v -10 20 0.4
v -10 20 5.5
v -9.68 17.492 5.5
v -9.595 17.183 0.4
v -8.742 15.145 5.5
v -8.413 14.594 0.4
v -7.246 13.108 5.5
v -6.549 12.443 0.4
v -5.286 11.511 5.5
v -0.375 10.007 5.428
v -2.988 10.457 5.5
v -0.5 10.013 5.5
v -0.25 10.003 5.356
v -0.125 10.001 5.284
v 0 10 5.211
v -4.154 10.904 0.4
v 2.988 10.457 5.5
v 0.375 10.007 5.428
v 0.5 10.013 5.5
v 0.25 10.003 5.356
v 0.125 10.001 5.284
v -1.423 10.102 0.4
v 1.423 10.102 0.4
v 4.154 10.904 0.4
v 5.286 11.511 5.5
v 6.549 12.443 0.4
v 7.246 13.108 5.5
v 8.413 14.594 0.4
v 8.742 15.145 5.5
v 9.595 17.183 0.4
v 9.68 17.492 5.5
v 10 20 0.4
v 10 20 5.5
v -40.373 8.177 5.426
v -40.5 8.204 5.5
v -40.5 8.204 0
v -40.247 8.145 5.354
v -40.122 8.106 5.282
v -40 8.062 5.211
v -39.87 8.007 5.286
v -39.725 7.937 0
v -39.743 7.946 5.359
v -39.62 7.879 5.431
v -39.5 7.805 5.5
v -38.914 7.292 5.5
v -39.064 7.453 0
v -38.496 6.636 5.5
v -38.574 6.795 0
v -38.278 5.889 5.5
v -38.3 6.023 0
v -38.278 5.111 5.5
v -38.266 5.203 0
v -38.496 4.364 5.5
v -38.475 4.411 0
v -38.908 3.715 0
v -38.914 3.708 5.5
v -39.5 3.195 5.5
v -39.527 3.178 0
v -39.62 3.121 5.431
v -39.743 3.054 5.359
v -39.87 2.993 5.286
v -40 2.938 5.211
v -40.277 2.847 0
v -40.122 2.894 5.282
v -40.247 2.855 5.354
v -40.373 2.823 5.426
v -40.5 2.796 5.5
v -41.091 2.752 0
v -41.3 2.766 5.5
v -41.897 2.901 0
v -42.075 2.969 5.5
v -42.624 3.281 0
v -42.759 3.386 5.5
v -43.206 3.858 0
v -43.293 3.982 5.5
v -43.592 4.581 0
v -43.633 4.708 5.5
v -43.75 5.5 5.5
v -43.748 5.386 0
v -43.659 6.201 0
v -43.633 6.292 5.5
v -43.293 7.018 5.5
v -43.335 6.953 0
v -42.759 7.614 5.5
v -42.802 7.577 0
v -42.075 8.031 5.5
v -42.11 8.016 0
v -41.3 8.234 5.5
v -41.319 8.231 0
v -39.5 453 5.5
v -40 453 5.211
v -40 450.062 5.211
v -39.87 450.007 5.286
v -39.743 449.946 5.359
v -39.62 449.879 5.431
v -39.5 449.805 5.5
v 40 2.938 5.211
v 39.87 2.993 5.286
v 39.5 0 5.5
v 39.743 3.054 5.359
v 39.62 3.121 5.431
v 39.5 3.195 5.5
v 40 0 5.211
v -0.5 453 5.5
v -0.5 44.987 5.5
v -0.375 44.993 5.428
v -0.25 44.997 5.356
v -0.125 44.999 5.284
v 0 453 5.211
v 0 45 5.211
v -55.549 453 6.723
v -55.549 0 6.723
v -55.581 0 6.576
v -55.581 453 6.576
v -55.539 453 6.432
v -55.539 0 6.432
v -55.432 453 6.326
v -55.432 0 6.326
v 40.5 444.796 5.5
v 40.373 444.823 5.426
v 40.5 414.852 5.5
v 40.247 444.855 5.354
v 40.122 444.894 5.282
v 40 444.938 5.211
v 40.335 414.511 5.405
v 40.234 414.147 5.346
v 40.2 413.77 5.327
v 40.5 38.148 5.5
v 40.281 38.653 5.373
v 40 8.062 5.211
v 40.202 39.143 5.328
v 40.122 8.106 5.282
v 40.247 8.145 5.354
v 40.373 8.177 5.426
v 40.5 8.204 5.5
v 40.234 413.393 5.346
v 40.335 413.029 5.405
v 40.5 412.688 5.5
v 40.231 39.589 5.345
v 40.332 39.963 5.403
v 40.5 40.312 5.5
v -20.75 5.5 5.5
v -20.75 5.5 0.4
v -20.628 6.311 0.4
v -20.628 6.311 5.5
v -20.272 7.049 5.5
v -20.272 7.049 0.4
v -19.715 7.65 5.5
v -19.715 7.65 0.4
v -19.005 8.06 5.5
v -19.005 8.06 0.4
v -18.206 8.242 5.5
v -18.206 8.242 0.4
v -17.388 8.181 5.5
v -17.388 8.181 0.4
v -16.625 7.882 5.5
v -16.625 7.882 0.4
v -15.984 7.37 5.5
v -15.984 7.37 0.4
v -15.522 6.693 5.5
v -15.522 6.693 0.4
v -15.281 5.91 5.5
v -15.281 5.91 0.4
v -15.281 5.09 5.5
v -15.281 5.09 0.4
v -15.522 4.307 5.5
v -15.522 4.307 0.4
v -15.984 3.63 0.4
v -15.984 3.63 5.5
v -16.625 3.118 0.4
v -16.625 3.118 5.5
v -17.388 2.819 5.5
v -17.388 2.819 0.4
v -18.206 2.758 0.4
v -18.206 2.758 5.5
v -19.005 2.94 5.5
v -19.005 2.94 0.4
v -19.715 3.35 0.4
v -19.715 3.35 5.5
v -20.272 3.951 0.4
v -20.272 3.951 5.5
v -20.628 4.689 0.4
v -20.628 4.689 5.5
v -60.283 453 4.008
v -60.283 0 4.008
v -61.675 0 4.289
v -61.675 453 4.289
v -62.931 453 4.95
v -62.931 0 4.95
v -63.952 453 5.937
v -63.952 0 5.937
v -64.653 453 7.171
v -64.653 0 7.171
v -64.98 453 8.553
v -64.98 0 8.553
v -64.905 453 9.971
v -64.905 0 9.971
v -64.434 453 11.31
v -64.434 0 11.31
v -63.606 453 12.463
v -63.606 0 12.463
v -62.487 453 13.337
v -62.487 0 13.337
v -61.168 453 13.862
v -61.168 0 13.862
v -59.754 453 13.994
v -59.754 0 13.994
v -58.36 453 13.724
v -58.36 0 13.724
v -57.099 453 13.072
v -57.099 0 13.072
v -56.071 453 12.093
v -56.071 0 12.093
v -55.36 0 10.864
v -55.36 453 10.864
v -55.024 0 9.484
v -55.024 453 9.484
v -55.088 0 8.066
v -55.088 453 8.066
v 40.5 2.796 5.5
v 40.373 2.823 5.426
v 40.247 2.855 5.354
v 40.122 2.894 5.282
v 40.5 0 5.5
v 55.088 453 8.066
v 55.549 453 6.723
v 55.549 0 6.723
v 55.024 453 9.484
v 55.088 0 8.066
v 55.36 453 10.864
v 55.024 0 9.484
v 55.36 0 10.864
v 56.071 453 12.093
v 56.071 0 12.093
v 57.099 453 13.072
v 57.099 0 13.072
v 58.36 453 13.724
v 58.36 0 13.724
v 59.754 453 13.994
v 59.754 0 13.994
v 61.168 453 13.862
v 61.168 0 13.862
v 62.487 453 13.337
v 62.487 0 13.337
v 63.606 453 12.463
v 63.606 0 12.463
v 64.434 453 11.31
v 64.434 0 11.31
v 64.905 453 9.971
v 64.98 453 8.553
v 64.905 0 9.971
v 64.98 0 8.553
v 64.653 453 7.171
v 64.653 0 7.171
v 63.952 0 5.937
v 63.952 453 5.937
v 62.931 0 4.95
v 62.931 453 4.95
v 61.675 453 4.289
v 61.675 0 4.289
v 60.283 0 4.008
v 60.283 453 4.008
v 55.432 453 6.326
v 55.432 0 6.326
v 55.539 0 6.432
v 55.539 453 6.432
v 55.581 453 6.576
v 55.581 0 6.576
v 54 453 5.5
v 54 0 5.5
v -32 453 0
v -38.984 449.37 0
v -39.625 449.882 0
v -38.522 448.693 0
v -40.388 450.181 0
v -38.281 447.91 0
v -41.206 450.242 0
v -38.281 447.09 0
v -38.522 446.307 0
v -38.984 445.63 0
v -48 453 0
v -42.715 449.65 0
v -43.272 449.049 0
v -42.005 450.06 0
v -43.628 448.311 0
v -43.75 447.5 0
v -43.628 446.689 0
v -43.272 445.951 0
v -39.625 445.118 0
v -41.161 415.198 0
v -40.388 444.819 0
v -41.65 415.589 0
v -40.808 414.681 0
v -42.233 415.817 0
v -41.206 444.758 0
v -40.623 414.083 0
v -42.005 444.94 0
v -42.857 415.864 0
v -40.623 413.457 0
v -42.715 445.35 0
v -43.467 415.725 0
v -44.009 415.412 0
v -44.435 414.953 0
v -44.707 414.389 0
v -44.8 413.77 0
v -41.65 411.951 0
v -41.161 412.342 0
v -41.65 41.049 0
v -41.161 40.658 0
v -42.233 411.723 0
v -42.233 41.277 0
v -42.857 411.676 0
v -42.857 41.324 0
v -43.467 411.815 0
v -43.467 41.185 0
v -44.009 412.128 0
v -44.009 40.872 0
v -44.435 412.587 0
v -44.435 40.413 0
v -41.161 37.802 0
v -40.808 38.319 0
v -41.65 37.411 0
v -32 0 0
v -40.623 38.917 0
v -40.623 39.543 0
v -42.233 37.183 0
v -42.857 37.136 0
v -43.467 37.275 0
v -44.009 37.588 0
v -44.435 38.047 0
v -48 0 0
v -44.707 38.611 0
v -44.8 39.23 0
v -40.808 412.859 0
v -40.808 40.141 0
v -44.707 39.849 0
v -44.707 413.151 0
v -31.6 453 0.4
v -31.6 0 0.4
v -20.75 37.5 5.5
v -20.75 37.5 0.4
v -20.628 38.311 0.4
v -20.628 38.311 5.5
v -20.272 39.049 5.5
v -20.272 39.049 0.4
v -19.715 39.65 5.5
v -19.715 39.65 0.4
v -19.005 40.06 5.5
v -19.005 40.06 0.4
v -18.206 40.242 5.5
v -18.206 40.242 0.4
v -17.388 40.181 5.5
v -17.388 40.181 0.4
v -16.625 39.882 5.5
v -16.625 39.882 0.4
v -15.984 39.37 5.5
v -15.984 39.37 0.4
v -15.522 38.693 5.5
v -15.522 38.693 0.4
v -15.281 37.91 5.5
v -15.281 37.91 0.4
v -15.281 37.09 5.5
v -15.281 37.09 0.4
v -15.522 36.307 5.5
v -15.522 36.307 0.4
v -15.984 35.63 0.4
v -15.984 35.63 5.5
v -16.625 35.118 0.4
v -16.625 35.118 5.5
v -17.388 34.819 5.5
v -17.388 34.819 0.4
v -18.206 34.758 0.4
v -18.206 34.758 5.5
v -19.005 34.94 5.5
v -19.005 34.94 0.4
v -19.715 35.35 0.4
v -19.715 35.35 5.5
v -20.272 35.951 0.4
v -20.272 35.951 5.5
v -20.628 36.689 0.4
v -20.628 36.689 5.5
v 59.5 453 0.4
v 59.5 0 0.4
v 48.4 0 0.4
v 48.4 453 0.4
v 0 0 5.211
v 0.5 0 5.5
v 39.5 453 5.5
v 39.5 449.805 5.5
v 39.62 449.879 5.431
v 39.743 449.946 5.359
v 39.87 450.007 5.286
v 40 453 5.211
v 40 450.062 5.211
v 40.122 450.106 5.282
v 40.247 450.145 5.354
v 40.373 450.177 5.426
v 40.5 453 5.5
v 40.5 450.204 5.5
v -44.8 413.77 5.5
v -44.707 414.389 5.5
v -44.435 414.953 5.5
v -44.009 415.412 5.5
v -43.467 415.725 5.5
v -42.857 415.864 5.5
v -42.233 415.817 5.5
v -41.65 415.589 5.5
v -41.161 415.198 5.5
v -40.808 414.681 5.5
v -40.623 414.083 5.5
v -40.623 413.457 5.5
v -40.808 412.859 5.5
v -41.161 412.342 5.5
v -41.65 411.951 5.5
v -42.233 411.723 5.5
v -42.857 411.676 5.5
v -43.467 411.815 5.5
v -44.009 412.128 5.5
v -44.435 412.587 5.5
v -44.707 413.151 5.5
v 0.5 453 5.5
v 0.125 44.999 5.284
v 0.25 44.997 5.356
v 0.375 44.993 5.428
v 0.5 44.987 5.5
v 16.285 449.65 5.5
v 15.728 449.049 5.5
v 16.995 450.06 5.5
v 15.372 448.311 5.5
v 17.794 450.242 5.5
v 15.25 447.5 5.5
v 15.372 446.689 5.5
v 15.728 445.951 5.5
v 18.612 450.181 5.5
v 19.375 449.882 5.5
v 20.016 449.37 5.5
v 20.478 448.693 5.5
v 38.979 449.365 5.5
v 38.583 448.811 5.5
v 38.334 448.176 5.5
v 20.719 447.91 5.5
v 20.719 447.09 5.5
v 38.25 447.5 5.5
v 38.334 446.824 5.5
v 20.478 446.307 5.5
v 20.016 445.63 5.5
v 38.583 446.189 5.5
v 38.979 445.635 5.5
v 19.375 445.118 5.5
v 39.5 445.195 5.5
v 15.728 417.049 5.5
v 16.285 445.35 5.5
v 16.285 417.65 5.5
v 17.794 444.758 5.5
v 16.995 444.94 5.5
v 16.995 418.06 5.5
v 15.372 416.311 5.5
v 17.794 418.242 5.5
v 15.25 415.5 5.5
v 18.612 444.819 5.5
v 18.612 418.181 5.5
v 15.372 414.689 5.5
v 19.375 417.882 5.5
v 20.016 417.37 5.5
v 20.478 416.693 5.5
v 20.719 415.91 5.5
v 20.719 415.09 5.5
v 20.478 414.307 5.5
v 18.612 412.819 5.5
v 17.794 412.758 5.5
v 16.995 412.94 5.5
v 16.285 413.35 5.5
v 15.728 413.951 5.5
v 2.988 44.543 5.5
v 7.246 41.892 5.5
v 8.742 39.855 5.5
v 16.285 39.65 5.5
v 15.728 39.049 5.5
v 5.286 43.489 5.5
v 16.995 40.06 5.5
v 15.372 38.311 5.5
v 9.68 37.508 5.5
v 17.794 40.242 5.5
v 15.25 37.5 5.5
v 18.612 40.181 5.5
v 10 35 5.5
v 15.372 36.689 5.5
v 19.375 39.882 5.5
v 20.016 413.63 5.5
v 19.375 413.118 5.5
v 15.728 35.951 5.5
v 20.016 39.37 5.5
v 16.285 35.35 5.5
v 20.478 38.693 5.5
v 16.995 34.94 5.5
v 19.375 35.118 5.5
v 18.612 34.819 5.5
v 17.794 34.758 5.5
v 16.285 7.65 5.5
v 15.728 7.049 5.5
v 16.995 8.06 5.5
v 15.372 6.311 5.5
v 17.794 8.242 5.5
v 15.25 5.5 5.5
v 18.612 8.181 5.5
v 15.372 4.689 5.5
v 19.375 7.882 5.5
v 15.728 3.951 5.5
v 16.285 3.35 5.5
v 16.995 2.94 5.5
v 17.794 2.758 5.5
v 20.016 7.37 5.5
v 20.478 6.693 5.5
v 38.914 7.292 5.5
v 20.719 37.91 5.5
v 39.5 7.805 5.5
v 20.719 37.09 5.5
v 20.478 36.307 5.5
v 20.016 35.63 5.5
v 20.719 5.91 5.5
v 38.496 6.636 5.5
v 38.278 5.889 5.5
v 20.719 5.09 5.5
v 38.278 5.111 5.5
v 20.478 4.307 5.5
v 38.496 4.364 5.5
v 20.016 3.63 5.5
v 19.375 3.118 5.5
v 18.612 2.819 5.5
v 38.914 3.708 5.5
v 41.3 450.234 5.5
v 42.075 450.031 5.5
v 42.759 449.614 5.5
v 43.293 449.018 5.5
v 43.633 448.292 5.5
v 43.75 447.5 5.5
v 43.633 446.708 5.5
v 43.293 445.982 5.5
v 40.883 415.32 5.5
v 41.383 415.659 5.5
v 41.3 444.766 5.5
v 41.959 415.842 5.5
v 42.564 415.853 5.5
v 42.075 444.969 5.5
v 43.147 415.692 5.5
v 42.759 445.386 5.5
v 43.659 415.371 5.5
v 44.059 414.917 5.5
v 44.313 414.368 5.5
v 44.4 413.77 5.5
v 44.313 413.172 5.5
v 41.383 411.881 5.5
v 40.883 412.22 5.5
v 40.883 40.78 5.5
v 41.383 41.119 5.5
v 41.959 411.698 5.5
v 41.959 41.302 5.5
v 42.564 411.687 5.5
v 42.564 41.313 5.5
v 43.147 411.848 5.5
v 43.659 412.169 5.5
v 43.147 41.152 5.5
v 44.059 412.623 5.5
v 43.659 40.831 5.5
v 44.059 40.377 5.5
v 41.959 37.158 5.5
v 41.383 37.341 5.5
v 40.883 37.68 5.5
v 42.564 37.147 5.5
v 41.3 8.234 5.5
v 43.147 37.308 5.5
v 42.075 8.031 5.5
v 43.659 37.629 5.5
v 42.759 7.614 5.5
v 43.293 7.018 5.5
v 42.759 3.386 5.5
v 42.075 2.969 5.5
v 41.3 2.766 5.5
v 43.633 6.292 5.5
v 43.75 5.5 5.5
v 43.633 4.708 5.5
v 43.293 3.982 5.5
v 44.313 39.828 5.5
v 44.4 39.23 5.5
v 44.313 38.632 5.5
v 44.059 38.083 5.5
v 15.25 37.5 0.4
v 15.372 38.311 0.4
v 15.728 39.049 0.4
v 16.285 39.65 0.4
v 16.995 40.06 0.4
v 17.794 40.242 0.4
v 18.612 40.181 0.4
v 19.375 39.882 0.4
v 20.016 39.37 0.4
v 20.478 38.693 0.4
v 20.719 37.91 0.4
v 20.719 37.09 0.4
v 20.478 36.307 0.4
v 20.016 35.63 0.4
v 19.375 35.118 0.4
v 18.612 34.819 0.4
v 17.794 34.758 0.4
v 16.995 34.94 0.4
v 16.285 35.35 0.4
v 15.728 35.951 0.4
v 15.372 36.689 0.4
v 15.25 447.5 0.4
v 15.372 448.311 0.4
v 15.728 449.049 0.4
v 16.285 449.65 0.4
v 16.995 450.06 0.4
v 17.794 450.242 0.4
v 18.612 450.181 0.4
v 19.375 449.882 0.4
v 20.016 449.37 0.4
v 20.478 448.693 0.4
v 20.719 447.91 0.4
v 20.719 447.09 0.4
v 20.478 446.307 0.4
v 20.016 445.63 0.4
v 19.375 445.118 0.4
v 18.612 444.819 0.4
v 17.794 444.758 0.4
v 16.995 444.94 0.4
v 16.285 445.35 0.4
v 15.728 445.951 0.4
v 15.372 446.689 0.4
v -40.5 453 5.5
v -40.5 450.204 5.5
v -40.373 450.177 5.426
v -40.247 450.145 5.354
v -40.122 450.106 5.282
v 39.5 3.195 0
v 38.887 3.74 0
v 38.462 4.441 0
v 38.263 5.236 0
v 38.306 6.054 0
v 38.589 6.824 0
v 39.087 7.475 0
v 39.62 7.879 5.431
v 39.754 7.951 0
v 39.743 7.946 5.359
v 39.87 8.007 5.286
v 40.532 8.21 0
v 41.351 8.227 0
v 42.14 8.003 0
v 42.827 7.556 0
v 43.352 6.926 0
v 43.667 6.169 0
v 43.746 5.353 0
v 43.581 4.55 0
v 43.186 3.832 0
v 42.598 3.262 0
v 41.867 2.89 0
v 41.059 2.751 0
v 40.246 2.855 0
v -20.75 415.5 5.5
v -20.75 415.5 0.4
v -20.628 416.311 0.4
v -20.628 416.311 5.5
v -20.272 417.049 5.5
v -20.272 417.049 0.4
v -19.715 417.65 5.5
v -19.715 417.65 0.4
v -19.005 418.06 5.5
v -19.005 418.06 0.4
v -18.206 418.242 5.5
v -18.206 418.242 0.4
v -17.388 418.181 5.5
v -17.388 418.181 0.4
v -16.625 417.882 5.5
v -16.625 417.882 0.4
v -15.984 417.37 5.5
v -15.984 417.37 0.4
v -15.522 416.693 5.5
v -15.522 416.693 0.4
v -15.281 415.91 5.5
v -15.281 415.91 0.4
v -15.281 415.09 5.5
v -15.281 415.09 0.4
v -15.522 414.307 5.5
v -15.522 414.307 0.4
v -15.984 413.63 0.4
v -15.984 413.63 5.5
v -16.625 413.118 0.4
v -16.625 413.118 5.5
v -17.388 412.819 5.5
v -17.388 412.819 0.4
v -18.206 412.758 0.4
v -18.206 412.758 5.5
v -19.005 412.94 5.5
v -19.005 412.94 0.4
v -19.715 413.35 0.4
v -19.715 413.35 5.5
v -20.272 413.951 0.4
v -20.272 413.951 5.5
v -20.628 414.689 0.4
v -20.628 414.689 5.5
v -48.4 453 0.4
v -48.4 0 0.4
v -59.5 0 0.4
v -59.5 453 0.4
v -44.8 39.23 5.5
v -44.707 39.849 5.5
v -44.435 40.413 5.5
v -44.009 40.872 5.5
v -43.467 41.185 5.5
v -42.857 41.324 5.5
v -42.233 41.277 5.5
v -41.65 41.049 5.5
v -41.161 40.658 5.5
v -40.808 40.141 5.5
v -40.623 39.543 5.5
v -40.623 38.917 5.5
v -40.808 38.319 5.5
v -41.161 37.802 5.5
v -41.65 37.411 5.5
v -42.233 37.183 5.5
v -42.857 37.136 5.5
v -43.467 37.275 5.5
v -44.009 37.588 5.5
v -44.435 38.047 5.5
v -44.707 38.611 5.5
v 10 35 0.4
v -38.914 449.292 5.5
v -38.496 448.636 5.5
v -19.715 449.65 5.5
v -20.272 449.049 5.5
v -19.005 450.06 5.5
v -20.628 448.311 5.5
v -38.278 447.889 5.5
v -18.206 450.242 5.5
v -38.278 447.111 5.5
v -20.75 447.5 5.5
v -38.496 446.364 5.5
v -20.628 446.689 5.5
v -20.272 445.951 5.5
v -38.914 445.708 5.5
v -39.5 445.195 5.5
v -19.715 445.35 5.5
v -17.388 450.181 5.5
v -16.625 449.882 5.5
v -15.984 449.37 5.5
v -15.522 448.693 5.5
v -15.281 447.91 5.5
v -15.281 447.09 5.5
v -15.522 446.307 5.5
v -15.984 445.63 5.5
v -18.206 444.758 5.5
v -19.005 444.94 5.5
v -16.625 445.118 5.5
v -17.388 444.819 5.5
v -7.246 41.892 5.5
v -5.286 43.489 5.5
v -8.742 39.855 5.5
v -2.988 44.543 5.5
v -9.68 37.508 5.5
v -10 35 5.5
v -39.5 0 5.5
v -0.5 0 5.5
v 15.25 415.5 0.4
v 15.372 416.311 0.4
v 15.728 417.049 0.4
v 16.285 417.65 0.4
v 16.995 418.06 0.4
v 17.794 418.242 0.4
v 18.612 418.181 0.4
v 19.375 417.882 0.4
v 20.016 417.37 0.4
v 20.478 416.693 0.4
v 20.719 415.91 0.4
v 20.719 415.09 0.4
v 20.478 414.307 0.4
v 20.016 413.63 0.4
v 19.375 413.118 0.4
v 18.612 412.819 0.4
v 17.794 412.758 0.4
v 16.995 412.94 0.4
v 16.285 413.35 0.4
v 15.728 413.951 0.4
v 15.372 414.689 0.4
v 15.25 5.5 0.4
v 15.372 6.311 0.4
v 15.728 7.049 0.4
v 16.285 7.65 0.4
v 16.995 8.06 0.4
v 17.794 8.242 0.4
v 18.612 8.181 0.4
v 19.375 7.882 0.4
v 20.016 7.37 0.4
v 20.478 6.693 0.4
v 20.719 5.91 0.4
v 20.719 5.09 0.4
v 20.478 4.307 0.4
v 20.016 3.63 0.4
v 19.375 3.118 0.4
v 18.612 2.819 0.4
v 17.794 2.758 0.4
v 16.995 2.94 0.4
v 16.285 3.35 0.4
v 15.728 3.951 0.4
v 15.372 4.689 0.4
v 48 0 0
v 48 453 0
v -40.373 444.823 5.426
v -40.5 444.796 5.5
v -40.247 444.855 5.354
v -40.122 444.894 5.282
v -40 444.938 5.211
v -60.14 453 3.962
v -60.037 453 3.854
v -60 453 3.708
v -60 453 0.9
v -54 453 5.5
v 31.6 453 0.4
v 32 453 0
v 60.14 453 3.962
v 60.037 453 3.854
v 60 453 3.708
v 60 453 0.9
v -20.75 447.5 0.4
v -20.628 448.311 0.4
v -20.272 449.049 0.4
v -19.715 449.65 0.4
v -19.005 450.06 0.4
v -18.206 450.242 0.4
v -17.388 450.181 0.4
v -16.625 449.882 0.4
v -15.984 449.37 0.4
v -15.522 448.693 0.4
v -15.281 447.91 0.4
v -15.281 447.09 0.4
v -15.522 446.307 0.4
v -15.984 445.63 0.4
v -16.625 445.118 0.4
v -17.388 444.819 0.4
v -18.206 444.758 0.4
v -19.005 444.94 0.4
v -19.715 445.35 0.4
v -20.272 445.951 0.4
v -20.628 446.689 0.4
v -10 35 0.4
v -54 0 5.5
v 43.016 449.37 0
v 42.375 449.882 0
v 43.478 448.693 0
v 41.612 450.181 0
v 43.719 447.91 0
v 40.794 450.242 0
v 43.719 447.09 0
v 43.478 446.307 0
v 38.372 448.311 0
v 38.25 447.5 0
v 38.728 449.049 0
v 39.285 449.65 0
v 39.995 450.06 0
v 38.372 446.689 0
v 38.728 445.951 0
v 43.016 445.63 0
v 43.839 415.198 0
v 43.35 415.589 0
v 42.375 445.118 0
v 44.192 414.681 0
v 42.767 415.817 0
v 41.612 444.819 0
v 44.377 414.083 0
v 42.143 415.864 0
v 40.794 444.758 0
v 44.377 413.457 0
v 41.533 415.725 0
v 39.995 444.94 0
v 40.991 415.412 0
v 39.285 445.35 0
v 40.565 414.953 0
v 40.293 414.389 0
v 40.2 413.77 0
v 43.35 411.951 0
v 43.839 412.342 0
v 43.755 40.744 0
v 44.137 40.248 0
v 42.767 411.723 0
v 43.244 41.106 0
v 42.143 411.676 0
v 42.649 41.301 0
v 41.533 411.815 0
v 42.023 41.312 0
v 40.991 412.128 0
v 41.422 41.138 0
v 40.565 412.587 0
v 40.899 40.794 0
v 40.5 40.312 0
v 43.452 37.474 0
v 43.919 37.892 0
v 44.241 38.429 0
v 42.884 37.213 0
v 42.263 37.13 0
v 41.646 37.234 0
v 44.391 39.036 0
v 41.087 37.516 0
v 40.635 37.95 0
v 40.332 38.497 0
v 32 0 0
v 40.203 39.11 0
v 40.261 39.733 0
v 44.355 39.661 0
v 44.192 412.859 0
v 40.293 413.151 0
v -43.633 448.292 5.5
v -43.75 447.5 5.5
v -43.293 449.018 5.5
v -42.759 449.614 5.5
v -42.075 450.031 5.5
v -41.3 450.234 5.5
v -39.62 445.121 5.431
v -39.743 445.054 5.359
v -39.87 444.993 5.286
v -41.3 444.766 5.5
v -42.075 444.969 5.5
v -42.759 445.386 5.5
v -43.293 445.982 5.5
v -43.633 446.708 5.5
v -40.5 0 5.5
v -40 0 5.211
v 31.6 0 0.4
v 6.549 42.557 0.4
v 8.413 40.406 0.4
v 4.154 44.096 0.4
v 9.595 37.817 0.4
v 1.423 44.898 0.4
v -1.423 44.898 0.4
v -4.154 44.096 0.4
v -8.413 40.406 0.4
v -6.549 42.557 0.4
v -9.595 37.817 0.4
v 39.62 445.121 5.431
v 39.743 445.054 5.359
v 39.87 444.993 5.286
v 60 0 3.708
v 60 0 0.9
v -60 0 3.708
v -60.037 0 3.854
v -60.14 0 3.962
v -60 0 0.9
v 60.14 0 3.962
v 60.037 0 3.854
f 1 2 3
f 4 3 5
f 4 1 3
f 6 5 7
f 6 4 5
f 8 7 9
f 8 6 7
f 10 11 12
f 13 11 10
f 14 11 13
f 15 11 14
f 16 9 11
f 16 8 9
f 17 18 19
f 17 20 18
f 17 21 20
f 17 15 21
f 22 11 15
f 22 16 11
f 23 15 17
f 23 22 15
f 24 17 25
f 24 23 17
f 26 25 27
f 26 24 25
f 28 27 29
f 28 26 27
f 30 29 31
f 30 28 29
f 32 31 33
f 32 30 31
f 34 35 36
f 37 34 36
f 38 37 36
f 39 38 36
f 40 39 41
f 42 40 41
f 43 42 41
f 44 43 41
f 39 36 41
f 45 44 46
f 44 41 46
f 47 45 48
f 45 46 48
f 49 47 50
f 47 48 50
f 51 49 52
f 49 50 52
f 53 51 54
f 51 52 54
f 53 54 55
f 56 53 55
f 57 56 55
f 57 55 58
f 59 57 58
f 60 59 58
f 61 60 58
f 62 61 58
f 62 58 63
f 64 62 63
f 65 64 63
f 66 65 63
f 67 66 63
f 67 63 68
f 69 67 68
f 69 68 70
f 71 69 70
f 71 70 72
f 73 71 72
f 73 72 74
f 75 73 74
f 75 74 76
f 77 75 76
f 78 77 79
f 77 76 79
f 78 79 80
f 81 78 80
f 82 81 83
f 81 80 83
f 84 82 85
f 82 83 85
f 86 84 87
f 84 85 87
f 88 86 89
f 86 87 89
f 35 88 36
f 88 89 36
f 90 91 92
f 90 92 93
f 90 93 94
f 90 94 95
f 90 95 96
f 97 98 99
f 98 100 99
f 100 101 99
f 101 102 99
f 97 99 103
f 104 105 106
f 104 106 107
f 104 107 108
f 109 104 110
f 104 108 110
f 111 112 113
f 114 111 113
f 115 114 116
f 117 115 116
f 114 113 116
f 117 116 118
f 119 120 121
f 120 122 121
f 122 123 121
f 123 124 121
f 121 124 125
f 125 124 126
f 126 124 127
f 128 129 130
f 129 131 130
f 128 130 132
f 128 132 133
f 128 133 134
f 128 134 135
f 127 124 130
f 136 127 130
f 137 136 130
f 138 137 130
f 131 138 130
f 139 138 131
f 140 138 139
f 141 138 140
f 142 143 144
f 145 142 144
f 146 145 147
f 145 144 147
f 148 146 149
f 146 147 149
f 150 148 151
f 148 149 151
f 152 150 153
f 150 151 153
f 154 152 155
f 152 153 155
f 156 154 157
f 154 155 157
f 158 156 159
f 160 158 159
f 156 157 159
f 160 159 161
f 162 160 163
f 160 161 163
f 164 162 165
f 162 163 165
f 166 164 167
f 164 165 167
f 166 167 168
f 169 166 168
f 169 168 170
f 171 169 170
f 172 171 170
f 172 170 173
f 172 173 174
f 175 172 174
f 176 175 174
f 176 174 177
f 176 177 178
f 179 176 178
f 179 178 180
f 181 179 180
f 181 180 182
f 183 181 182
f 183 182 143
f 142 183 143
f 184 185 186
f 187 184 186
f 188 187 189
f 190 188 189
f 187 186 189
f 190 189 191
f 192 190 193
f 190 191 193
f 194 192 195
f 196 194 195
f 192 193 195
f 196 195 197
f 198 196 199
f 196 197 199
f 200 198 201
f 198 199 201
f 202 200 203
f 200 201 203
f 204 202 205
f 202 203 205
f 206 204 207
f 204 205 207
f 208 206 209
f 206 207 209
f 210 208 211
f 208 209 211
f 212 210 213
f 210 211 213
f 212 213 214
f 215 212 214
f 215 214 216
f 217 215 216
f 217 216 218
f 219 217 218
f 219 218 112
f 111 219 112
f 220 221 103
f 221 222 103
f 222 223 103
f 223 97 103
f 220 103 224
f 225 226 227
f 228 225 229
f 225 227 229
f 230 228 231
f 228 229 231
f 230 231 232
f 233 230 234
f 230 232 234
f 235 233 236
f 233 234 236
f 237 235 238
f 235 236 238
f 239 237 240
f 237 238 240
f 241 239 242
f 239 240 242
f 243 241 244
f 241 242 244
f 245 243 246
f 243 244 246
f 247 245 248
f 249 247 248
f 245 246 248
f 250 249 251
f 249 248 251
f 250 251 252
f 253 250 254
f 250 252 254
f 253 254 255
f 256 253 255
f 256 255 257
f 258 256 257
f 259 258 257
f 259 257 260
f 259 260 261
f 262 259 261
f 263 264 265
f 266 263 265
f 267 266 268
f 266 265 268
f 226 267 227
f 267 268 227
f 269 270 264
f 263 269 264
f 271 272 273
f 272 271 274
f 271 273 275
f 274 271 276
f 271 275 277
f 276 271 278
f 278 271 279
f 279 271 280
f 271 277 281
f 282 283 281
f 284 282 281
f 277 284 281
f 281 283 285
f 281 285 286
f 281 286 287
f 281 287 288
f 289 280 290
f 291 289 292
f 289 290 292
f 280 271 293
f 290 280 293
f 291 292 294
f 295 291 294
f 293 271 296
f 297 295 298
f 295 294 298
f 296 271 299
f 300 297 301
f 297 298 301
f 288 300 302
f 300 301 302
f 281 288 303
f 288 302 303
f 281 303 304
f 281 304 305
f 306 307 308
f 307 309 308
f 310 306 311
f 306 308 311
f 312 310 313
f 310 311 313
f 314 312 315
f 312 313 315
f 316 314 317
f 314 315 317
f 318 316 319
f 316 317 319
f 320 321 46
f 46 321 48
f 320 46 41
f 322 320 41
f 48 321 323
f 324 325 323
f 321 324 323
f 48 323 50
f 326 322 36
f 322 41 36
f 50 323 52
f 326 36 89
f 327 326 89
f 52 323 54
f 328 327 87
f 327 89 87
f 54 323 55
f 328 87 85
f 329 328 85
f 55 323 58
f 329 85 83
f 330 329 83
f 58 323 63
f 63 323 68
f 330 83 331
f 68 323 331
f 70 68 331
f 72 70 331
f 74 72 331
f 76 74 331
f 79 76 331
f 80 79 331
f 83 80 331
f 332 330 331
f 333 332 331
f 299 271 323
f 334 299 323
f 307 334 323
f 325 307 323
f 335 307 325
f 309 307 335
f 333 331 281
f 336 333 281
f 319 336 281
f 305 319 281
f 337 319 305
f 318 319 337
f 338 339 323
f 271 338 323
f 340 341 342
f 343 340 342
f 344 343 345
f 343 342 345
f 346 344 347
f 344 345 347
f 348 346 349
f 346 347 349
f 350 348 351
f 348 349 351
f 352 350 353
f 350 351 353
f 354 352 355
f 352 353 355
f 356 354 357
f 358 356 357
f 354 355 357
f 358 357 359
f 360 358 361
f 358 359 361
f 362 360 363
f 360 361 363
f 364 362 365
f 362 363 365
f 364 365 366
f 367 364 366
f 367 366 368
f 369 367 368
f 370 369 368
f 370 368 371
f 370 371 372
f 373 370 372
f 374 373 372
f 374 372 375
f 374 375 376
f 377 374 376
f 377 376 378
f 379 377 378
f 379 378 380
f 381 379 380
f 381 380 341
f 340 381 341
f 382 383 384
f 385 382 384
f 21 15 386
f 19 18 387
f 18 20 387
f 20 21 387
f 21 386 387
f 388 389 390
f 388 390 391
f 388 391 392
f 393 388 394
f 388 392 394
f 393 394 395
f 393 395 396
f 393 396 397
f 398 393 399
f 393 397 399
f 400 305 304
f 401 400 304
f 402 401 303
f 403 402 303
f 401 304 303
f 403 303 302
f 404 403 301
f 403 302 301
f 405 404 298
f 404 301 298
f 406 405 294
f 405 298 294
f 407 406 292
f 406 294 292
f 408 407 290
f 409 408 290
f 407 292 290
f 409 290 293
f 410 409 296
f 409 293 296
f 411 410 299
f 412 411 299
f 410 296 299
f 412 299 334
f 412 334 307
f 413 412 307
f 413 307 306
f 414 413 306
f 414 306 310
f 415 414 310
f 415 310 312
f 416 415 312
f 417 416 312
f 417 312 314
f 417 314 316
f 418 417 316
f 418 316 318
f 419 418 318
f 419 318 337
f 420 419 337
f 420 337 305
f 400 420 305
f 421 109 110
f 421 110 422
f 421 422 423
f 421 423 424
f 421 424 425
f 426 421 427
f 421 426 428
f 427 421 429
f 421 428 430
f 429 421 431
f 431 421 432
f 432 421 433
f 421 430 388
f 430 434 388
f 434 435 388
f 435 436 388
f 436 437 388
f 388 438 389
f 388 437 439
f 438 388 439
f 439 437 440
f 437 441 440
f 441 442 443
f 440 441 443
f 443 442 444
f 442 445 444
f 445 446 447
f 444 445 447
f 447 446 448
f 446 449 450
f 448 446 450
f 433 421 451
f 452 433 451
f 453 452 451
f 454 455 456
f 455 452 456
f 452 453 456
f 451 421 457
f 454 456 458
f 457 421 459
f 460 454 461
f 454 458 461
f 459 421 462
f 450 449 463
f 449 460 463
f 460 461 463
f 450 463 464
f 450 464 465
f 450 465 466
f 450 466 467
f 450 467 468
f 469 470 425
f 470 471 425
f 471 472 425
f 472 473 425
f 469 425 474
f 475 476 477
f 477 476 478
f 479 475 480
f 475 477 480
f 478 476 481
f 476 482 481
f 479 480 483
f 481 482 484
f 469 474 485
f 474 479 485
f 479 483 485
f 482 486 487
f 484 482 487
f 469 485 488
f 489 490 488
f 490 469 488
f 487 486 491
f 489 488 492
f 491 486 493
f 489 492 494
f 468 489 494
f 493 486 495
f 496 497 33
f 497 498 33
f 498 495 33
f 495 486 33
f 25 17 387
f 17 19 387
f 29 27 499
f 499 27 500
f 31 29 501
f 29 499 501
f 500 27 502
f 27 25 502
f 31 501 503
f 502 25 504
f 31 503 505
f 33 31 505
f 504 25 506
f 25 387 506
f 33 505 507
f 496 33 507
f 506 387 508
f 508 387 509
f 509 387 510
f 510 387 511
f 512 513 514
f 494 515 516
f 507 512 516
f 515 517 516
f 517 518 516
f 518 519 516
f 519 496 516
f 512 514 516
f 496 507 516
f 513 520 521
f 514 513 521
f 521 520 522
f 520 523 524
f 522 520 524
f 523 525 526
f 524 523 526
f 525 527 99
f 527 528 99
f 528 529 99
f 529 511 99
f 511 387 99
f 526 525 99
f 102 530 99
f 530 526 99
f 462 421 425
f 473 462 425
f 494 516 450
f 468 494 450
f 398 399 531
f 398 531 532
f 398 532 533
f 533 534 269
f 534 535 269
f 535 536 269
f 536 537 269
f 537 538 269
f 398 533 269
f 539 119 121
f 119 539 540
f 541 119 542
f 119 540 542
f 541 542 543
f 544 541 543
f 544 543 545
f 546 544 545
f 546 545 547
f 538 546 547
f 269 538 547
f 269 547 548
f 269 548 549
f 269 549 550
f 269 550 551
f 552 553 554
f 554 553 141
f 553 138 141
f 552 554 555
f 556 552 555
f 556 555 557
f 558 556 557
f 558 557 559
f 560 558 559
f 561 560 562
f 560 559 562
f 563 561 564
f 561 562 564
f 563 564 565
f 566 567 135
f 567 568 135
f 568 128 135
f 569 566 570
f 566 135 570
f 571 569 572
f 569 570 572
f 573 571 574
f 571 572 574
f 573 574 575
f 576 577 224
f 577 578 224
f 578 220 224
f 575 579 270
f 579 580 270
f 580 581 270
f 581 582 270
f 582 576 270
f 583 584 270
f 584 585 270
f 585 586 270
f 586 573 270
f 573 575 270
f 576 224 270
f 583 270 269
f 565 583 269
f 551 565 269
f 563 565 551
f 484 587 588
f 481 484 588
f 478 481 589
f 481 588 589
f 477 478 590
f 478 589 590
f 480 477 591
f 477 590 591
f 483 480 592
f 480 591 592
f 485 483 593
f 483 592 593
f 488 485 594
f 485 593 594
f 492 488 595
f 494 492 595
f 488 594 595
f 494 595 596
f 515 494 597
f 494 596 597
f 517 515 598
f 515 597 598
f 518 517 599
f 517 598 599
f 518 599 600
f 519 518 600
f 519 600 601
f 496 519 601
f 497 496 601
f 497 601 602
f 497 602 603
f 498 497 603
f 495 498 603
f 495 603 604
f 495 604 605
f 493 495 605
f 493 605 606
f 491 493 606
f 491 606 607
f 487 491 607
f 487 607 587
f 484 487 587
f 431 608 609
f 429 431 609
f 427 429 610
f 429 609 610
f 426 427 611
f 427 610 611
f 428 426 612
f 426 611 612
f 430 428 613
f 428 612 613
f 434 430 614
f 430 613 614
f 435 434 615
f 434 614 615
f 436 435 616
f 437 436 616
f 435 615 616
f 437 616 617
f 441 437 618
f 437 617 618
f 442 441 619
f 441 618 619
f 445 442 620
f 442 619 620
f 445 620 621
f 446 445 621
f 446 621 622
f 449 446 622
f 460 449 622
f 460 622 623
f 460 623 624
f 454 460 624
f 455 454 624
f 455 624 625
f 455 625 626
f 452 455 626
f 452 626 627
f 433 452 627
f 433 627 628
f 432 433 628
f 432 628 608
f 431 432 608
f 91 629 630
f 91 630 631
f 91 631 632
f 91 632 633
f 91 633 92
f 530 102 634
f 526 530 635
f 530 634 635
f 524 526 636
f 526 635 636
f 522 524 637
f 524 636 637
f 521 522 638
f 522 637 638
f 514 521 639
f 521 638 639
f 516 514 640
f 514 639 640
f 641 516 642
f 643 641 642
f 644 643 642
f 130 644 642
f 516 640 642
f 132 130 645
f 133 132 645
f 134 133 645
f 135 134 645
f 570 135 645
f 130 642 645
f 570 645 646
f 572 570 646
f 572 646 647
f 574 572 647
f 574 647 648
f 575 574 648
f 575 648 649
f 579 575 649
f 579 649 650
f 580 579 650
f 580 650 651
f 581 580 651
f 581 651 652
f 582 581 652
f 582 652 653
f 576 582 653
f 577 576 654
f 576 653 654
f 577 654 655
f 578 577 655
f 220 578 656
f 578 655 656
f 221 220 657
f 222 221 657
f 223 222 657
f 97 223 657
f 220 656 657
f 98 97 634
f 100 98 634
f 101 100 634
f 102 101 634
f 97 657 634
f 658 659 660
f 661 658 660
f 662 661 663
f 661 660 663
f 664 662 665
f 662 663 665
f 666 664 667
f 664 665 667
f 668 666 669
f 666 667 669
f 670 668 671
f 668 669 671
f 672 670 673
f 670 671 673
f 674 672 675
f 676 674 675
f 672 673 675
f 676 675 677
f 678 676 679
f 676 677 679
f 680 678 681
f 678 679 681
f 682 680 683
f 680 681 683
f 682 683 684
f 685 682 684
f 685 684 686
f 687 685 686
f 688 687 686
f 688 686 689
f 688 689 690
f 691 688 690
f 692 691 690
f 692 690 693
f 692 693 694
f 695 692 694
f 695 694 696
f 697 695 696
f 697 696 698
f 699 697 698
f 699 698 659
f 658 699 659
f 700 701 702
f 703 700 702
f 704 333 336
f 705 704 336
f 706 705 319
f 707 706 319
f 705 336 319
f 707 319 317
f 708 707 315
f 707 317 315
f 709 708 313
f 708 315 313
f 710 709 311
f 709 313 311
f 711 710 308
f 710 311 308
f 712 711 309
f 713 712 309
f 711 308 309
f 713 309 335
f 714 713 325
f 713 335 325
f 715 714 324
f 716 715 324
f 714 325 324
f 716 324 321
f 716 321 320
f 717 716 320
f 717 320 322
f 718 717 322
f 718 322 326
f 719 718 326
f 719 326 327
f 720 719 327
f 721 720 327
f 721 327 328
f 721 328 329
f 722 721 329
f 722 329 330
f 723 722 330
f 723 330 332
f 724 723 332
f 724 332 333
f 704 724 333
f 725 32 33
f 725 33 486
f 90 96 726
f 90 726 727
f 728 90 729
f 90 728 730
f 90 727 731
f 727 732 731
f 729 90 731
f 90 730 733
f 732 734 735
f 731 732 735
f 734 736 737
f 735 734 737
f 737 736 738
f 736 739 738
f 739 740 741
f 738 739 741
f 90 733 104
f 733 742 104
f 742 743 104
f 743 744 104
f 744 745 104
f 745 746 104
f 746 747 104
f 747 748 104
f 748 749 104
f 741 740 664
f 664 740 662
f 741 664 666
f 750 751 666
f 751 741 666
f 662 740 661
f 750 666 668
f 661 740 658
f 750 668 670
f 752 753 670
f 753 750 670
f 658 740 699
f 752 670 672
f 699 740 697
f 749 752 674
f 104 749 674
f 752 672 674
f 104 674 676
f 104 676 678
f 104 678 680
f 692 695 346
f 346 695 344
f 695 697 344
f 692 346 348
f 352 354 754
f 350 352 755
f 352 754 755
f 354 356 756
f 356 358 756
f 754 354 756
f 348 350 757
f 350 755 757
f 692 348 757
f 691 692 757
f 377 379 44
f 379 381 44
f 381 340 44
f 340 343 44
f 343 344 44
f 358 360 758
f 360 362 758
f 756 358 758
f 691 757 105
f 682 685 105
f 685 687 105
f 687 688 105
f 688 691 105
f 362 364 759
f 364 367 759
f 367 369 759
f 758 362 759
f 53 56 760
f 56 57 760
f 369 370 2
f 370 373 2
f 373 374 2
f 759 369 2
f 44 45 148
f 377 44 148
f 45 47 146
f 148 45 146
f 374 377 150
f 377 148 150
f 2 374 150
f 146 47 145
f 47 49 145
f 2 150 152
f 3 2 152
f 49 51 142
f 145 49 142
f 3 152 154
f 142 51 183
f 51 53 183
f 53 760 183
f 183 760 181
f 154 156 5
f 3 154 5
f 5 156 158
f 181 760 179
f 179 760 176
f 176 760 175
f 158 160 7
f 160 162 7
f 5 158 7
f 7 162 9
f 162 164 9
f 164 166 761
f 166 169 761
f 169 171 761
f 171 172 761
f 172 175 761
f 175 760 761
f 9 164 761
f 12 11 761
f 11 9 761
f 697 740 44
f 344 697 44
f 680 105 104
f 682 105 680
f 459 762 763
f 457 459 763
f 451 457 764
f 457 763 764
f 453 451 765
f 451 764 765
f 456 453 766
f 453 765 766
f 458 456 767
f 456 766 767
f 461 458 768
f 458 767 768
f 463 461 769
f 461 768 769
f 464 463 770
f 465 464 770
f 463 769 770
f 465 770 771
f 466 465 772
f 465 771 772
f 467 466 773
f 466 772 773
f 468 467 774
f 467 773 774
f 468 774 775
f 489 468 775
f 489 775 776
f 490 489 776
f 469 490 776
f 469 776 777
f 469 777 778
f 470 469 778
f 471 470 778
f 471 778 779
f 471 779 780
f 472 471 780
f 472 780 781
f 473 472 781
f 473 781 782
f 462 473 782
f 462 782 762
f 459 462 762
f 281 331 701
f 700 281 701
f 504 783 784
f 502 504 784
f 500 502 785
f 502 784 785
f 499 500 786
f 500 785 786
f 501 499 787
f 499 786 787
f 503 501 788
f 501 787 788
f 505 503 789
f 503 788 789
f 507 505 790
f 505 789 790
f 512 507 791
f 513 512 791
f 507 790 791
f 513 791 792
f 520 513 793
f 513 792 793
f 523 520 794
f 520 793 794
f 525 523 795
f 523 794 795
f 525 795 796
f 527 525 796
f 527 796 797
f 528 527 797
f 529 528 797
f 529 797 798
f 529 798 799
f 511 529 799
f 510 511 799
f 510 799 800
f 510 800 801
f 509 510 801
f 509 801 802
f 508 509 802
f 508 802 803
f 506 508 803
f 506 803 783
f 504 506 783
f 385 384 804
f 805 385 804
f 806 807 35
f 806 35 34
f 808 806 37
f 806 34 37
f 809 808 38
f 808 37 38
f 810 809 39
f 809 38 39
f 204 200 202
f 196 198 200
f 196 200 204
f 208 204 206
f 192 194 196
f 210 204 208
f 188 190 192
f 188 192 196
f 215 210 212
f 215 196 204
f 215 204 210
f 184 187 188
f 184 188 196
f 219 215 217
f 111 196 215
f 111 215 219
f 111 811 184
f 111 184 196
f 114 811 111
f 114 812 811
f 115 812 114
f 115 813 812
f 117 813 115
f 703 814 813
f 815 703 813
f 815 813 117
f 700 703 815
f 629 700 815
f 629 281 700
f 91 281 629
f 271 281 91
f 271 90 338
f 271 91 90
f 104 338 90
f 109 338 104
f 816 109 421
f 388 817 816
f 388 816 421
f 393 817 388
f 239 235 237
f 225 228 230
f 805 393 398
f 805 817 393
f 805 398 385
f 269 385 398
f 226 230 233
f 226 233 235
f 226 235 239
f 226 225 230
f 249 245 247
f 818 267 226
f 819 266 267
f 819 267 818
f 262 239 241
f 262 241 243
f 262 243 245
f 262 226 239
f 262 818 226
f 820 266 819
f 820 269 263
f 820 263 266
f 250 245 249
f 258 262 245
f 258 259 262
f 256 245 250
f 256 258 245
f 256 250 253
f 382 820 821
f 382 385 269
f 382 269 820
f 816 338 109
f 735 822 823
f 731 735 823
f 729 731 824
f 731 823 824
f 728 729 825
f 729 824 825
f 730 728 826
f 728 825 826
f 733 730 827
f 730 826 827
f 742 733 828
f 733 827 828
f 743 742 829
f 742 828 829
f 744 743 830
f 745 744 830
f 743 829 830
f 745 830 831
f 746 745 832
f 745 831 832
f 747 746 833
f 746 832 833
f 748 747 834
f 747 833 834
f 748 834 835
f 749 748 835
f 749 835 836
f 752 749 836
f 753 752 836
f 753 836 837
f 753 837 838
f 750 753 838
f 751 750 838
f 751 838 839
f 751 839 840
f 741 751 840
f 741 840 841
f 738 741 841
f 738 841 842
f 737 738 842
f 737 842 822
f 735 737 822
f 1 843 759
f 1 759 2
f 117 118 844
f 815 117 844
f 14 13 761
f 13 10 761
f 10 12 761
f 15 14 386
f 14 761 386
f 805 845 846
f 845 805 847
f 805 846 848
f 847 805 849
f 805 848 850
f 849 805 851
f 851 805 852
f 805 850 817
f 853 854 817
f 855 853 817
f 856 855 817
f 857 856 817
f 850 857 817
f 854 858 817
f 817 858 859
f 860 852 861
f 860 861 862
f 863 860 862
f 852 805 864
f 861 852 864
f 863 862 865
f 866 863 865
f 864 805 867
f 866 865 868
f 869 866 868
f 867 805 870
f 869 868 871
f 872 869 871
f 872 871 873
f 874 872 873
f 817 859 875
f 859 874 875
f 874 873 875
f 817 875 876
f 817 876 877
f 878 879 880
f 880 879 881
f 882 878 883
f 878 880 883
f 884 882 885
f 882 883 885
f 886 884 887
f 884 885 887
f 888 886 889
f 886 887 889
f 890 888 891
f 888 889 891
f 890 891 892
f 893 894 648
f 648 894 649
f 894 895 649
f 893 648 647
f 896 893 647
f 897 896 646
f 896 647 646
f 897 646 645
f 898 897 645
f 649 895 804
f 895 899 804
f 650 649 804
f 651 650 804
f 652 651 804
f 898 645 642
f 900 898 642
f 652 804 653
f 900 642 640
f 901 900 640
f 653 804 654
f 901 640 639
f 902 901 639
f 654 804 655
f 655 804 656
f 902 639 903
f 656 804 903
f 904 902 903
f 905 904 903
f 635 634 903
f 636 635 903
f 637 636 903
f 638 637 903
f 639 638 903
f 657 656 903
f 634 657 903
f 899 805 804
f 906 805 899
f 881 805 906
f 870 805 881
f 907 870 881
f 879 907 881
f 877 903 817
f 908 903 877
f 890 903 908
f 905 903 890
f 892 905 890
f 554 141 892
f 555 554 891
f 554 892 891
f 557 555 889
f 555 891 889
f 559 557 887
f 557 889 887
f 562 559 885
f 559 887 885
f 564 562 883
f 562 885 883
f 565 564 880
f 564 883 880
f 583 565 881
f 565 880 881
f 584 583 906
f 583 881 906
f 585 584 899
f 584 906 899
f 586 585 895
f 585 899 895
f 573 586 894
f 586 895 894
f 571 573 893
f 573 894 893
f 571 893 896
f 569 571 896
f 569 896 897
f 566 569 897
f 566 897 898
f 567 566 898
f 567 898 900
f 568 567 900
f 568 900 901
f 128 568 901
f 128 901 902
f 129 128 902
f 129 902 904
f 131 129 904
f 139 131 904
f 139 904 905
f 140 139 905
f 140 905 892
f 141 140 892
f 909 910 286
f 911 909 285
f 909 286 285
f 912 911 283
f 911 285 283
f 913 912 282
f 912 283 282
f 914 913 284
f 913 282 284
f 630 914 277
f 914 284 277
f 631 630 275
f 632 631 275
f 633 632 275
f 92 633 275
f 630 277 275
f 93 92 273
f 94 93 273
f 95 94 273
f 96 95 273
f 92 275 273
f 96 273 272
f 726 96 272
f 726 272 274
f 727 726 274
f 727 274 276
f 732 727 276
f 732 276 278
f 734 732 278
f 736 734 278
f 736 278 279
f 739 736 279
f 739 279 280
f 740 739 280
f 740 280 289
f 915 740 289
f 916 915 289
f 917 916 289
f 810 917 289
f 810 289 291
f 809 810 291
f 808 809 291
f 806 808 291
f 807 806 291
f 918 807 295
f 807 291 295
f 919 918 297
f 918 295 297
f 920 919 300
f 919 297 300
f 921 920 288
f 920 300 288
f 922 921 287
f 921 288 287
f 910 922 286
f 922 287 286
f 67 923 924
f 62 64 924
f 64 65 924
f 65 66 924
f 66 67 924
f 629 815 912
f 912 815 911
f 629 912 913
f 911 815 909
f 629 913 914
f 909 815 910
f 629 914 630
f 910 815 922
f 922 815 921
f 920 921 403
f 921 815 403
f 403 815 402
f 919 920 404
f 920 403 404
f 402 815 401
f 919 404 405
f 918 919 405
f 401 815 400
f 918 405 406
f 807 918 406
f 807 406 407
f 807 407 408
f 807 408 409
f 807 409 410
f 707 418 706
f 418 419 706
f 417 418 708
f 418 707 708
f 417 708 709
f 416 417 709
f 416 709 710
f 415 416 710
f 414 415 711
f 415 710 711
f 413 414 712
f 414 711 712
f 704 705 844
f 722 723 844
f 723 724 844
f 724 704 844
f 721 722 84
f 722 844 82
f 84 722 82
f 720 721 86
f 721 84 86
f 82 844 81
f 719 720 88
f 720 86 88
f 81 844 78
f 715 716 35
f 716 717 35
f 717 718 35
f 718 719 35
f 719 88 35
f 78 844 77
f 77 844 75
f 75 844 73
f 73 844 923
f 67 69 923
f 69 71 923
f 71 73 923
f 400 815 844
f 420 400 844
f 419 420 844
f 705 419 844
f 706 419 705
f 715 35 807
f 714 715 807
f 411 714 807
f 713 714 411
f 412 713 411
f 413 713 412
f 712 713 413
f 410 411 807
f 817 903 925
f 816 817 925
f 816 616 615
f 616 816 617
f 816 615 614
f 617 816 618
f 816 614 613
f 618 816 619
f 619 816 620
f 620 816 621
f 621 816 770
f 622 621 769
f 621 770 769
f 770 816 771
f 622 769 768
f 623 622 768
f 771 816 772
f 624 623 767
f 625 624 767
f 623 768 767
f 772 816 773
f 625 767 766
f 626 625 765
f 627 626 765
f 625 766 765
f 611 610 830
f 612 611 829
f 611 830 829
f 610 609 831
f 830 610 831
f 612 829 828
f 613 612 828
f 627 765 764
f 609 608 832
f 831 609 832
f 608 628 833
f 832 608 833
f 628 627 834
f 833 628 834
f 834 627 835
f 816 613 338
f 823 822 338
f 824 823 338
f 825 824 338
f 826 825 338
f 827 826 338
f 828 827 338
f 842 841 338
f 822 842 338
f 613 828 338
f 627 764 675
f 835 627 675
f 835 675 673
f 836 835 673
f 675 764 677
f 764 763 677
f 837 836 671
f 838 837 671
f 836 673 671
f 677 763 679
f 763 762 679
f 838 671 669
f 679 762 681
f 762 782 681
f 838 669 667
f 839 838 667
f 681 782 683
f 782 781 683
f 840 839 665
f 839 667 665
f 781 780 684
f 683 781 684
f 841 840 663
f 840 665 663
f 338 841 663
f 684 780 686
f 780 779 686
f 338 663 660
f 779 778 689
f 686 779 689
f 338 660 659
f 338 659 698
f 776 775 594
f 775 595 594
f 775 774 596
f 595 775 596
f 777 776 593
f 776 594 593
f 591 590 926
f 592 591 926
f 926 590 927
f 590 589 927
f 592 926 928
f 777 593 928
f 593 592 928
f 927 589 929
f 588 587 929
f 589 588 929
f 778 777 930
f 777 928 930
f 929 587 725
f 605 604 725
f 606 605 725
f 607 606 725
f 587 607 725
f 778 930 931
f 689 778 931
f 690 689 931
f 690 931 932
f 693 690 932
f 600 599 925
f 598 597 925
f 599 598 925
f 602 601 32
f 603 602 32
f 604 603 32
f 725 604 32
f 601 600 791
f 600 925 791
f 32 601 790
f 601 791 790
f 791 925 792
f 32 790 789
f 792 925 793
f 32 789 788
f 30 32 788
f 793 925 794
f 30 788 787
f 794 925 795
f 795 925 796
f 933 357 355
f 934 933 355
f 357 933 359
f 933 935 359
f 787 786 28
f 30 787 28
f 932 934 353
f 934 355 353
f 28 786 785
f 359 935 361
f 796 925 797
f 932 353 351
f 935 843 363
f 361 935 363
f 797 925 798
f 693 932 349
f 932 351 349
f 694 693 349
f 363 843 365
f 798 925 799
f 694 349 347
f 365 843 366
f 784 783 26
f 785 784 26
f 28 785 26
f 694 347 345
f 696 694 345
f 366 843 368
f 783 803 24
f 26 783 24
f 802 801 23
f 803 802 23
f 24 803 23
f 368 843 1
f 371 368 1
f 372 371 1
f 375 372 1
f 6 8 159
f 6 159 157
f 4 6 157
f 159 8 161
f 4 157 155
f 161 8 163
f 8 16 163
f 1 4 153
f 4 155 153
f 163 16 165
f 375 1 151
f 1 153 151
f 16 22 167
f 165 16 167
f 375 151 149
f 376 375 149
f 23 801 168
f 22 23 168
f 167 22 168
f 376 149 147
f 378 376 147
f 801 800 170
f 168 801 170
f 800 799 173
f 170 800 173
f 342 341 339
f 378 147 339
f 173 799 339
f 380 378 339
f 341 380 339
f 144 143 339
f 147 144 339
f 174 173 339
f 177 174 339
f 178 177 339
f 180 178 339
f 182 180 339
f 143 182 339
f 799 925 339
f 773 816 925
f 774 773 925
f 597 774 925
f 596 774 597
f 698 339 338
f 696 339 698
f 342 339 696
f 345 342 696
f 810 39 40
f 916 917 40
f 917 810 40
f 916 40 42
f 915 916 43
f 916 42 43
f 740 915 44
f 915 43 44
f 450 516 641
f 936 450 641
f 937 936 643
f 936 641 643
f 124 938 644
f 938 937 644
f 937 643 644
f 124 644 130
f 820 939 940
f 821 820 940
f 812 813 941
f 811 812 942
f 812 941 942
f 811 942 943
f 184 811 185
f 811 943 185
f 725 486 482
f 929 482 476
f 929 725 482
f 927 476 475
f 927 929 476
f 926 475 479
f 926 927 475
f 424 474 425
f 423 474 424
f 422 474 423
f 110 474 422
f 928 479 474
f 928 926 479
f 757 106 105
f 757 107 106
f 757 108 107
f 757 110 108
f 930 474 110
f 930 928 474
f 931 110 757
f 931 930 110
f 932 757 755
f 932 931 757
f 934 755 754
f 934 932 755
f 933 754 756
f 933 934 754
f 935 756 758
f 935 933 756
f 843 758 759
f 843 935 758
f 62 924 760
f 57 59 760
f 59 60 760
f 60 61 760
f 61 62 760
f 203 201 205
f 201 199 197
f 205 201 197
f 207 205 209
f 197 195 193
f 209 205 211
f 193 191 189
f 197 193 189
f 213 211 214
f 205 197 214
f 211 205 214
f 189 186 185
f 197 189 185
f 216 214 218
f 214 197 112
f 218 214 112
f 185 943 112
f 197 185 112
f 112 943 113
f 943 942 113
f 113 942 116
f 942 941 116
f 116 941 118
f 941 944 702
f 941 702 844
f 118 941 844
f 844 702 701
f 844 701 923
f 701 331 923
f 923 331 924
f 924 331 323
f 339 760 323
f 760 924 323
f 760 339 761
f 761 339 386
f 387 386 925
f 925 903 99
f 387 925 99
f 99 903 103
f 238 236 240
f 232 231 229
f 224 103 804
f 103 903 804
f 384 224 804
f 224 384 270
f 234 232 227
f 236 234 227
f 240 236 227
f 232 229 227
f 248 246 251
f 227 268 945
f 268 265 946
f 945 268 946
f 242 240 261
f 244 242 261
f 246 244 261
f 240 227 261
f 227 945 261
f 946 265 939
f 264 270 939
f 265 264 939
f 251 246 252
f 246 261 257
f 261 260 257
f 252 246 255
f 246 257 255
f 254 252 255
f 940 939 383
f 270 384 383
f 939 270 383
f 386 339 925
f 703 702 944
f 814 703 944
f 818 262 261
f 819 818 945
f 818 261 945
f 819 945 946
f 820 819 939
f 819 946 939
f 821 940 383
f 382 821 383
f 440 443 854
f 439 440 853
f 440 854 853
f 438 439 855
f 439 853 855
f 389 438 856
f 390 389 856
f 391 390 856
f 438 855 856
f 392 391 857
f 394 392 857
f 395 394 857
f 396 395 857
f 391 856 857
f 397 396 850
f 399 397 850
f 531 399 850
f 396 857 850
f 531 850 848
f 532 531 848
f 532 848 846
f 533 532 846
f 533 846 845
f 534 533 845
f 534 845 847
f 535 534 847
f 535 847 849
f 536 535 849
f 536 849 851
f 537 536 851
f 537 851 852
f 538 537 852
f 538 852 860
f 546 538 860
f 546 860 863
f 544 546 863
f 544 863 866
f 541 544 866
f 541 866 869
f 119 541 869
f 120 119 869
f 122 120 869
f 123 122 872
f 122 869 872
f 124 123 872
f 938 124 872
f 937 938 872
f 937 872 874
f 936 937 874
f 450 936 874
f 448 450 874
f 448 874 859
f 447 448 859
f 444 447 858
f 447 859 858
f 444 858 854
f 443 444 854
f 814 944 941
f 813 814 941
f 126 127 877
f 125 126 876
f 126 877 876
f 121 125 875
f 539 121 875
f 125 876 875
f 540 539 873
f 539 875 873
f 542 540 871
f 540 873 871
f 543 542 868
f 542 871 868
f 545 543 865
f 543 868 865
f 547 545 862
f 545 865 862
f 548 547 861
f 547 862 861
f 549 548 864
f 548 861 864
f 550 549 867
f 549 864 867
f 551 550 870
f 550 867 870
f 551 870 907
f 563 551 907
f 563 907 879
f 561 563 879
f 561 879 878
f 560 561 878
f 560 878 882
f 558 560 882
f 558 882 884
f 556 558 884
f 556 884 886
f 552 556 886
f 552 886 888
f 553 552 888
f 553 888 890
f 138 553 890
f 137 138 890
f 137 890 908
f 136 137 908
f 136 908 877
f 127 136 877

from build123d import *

# Parameters (mm, degrees)
BOSS_EXTRUDE1_DEPTH      = 253
BOSS_EXTRUDE1_DEPTH_BACK = 200
SKETCH2_R                = 2.75
CUT_EXTRUDE1_DEPTH       = 458.853688421
SKETCH3_R                = 2.1
CUT_EXTRUDE2_DEPTH       = 458.853688421
CUT_EXTRUDE3_DEPTH       = 458.841632009


# Read off the part's stored shape, not the designer's step: Imported1
with BuildPart() as part:
    # Sketch1 → Boss-Extrude1 (new, two sides: drawn at the far end of the back side and taken through both)
    with BuildSketch(Plane(origin=(0, 200, 0), x_dir=(1, 0, 0), z_dir=(0, 1, 0)).offset(-BOSS_EXTRUDE1_DEPTH_BACK)):
        with BuildLine():
            Line((0, -5.21132487), (0.5, -5.5))
            Line((0.5, -5.5), (39.5, -5.5))
            Line((39.5, -5.5), (40, -5.21132487))
            Line((40, -5.21132487), (40.5, -5.5))
            Line((40.5, -5.5), (54, -5.5))
            Line((54, -5.5), (55.431521652, -6.326489411))
            ThreePointArc((55.431521652, -6.326489411), (55.569235651, -6.501322592), (55.548605331, -6.722921727))
            ThreePointArc((55.548605331, -6.722921727), (62.487270984, -13.337451224), (60.283018873, -4.0080164))
            ThreePointArc((60.283018873, -4.0080164), (60.081946867, -3.914538227), (60, -3.708497377))
            Line((60, -3.708497377), (60, -0.9))
            Line((60, -0.9), (59.5, -0.4))
            Line((59.5, -0.4), (48.4, -0.4))
            Line((48.4, -0.4), (48, 0))
            Line((48, 0), (32, 0))
            Line((32, 0), (31.6, -0.4))
            Line((31.6, -0.4), (-31.6, -0.4))
            Line((-31.6, -0.4), (-32, 0))
            Line((-32, 0), (-48, 0))
            Line((-48, 0), (-48.4, -0.4))
            Line((-48.4, -0.4), (-59.5, -0.4))
            Line((-59.5, -0.4), (-60, -0.9))
            Line((-60, -0.9), (-60, -3.708497387))
            ThreePointArc((-60, -3.708497387), (-60.081946862, -3.914538232), (-60.283018865, -4.0080164))
            ThreePointArc((-60.283018865, -4.0080164), (-62.487270987, -13.337451222), (-55.548605331, -6.722921727))
            ThreePointArc((-55.548605331, -6.722921727), (-55.569235651, -6.501322592), (-55.431521652, -6.326489411))
            Line((-55.431521652, -6.326489411), (-54, -5.5))
            Line((-54, -5.5), (-40.5, -5.5))
            Line((-40.5, -5.5), (-40, -5.21132487))
            Line((-40, -5.21132487), (-39.5, -5.5))
            Line((-39.5, -5.5), (-0.5, -5.5))
            Line((-0.5, -5.5), (0, -5.21132487))
        make_face()
    extrude(amount=BOSS_EXTRUDE1_DEPTH + BOSS_EXTRUDE1_DEPTH_BACK)

    # Sketch2 → Cut-Extrude1 (cut, through all)
    with BuildSketch(Plane(origin=(0, 0, 0), x_dir=(-1, 0, 0), z_dir=(0, 0, -1))):
        with Locations((-18, 415.5)):
            Circle(SKETCH2_R)
        with Locations((18, 415.5)):
            Circle(SKETCH2_R)
        with Locations((-18, 37.5)):
            Circle(SKETCH2_R)
        with Locations((18, 37.5)):
            Circle(SKETCH2_R)
        with Locations((-41, 447.5)):
            Circle(SKETCH2_R)
        with Locations((-18, 447.5)):
            Circle(SKETCH2_R)
        with Locations((18, 447.5)):
            Circle(SKETCH2_R)
        with Locations((41, 447.5)):
            Circle(SKETCH2_R)
        with Locations(Location((-41, 5.5, 0), (0, 0, 303.055731151))):
            Circle(SKETCH2_R)
        with Locations((-18, 5.5)):
            Circle(SKETCH2_R)
        with Locations((18, 5.5)):
            Circle(SKETCH2_R)
        with Locations(Location((41, 5.5, 0), (0, 0, 100.475681696))):
            Circle(SKETCH2_R)
    extrude(amount=-CUT_EXTRUDE1_DEPTH, mode=Mode.SUBTRACT)

    # Sketch3 → Cut-Extrude2 (cut, through all)
    with BuildSketch(Plane(origin=(0, 0, 0), x_dir=(-1, 0, 0), z_dir=(0, 0, -1))):
        with Locations((-42.3, 413.77)):
            Circle(SKETCH3_R)
        with Locations((42.7, 413.77)):
            Circle(SKETCH3_R)
        with Locations(Location((-42.3, 39.23, 0), (0, 0, 31.002719134))):
            Circle(SKETCH3_R)
        with Locations((42.7, 39.23)):
            Circle(SKETCH3_R)
    extrude(amount=-CUT_EXTRUDE2_DEPTH, mode=Mode.SUBTRACT)

    # Sketch4 → Cut-Extrude3 (cut, through all)
    with BuildSketch(Plane(origin=(0, 0, 0.4), x_dir=(-1, 0, 0), z_dir=(0, 0, -1))):
        with BuildLine():
            Line((10, 35), (10, 20))
            ThreePointArc((10, 20), (0, 10), (-10, 20))
            Line((-10, 20), (-10, 35))
            ThreePointArc((-10, 35), (0, 45), (10, 35))
        make_face()
    extrude(amount=-CUT_EXTRUDE3_DEPTH, mode=Mode.SUBTRACT)


solid = part.part
